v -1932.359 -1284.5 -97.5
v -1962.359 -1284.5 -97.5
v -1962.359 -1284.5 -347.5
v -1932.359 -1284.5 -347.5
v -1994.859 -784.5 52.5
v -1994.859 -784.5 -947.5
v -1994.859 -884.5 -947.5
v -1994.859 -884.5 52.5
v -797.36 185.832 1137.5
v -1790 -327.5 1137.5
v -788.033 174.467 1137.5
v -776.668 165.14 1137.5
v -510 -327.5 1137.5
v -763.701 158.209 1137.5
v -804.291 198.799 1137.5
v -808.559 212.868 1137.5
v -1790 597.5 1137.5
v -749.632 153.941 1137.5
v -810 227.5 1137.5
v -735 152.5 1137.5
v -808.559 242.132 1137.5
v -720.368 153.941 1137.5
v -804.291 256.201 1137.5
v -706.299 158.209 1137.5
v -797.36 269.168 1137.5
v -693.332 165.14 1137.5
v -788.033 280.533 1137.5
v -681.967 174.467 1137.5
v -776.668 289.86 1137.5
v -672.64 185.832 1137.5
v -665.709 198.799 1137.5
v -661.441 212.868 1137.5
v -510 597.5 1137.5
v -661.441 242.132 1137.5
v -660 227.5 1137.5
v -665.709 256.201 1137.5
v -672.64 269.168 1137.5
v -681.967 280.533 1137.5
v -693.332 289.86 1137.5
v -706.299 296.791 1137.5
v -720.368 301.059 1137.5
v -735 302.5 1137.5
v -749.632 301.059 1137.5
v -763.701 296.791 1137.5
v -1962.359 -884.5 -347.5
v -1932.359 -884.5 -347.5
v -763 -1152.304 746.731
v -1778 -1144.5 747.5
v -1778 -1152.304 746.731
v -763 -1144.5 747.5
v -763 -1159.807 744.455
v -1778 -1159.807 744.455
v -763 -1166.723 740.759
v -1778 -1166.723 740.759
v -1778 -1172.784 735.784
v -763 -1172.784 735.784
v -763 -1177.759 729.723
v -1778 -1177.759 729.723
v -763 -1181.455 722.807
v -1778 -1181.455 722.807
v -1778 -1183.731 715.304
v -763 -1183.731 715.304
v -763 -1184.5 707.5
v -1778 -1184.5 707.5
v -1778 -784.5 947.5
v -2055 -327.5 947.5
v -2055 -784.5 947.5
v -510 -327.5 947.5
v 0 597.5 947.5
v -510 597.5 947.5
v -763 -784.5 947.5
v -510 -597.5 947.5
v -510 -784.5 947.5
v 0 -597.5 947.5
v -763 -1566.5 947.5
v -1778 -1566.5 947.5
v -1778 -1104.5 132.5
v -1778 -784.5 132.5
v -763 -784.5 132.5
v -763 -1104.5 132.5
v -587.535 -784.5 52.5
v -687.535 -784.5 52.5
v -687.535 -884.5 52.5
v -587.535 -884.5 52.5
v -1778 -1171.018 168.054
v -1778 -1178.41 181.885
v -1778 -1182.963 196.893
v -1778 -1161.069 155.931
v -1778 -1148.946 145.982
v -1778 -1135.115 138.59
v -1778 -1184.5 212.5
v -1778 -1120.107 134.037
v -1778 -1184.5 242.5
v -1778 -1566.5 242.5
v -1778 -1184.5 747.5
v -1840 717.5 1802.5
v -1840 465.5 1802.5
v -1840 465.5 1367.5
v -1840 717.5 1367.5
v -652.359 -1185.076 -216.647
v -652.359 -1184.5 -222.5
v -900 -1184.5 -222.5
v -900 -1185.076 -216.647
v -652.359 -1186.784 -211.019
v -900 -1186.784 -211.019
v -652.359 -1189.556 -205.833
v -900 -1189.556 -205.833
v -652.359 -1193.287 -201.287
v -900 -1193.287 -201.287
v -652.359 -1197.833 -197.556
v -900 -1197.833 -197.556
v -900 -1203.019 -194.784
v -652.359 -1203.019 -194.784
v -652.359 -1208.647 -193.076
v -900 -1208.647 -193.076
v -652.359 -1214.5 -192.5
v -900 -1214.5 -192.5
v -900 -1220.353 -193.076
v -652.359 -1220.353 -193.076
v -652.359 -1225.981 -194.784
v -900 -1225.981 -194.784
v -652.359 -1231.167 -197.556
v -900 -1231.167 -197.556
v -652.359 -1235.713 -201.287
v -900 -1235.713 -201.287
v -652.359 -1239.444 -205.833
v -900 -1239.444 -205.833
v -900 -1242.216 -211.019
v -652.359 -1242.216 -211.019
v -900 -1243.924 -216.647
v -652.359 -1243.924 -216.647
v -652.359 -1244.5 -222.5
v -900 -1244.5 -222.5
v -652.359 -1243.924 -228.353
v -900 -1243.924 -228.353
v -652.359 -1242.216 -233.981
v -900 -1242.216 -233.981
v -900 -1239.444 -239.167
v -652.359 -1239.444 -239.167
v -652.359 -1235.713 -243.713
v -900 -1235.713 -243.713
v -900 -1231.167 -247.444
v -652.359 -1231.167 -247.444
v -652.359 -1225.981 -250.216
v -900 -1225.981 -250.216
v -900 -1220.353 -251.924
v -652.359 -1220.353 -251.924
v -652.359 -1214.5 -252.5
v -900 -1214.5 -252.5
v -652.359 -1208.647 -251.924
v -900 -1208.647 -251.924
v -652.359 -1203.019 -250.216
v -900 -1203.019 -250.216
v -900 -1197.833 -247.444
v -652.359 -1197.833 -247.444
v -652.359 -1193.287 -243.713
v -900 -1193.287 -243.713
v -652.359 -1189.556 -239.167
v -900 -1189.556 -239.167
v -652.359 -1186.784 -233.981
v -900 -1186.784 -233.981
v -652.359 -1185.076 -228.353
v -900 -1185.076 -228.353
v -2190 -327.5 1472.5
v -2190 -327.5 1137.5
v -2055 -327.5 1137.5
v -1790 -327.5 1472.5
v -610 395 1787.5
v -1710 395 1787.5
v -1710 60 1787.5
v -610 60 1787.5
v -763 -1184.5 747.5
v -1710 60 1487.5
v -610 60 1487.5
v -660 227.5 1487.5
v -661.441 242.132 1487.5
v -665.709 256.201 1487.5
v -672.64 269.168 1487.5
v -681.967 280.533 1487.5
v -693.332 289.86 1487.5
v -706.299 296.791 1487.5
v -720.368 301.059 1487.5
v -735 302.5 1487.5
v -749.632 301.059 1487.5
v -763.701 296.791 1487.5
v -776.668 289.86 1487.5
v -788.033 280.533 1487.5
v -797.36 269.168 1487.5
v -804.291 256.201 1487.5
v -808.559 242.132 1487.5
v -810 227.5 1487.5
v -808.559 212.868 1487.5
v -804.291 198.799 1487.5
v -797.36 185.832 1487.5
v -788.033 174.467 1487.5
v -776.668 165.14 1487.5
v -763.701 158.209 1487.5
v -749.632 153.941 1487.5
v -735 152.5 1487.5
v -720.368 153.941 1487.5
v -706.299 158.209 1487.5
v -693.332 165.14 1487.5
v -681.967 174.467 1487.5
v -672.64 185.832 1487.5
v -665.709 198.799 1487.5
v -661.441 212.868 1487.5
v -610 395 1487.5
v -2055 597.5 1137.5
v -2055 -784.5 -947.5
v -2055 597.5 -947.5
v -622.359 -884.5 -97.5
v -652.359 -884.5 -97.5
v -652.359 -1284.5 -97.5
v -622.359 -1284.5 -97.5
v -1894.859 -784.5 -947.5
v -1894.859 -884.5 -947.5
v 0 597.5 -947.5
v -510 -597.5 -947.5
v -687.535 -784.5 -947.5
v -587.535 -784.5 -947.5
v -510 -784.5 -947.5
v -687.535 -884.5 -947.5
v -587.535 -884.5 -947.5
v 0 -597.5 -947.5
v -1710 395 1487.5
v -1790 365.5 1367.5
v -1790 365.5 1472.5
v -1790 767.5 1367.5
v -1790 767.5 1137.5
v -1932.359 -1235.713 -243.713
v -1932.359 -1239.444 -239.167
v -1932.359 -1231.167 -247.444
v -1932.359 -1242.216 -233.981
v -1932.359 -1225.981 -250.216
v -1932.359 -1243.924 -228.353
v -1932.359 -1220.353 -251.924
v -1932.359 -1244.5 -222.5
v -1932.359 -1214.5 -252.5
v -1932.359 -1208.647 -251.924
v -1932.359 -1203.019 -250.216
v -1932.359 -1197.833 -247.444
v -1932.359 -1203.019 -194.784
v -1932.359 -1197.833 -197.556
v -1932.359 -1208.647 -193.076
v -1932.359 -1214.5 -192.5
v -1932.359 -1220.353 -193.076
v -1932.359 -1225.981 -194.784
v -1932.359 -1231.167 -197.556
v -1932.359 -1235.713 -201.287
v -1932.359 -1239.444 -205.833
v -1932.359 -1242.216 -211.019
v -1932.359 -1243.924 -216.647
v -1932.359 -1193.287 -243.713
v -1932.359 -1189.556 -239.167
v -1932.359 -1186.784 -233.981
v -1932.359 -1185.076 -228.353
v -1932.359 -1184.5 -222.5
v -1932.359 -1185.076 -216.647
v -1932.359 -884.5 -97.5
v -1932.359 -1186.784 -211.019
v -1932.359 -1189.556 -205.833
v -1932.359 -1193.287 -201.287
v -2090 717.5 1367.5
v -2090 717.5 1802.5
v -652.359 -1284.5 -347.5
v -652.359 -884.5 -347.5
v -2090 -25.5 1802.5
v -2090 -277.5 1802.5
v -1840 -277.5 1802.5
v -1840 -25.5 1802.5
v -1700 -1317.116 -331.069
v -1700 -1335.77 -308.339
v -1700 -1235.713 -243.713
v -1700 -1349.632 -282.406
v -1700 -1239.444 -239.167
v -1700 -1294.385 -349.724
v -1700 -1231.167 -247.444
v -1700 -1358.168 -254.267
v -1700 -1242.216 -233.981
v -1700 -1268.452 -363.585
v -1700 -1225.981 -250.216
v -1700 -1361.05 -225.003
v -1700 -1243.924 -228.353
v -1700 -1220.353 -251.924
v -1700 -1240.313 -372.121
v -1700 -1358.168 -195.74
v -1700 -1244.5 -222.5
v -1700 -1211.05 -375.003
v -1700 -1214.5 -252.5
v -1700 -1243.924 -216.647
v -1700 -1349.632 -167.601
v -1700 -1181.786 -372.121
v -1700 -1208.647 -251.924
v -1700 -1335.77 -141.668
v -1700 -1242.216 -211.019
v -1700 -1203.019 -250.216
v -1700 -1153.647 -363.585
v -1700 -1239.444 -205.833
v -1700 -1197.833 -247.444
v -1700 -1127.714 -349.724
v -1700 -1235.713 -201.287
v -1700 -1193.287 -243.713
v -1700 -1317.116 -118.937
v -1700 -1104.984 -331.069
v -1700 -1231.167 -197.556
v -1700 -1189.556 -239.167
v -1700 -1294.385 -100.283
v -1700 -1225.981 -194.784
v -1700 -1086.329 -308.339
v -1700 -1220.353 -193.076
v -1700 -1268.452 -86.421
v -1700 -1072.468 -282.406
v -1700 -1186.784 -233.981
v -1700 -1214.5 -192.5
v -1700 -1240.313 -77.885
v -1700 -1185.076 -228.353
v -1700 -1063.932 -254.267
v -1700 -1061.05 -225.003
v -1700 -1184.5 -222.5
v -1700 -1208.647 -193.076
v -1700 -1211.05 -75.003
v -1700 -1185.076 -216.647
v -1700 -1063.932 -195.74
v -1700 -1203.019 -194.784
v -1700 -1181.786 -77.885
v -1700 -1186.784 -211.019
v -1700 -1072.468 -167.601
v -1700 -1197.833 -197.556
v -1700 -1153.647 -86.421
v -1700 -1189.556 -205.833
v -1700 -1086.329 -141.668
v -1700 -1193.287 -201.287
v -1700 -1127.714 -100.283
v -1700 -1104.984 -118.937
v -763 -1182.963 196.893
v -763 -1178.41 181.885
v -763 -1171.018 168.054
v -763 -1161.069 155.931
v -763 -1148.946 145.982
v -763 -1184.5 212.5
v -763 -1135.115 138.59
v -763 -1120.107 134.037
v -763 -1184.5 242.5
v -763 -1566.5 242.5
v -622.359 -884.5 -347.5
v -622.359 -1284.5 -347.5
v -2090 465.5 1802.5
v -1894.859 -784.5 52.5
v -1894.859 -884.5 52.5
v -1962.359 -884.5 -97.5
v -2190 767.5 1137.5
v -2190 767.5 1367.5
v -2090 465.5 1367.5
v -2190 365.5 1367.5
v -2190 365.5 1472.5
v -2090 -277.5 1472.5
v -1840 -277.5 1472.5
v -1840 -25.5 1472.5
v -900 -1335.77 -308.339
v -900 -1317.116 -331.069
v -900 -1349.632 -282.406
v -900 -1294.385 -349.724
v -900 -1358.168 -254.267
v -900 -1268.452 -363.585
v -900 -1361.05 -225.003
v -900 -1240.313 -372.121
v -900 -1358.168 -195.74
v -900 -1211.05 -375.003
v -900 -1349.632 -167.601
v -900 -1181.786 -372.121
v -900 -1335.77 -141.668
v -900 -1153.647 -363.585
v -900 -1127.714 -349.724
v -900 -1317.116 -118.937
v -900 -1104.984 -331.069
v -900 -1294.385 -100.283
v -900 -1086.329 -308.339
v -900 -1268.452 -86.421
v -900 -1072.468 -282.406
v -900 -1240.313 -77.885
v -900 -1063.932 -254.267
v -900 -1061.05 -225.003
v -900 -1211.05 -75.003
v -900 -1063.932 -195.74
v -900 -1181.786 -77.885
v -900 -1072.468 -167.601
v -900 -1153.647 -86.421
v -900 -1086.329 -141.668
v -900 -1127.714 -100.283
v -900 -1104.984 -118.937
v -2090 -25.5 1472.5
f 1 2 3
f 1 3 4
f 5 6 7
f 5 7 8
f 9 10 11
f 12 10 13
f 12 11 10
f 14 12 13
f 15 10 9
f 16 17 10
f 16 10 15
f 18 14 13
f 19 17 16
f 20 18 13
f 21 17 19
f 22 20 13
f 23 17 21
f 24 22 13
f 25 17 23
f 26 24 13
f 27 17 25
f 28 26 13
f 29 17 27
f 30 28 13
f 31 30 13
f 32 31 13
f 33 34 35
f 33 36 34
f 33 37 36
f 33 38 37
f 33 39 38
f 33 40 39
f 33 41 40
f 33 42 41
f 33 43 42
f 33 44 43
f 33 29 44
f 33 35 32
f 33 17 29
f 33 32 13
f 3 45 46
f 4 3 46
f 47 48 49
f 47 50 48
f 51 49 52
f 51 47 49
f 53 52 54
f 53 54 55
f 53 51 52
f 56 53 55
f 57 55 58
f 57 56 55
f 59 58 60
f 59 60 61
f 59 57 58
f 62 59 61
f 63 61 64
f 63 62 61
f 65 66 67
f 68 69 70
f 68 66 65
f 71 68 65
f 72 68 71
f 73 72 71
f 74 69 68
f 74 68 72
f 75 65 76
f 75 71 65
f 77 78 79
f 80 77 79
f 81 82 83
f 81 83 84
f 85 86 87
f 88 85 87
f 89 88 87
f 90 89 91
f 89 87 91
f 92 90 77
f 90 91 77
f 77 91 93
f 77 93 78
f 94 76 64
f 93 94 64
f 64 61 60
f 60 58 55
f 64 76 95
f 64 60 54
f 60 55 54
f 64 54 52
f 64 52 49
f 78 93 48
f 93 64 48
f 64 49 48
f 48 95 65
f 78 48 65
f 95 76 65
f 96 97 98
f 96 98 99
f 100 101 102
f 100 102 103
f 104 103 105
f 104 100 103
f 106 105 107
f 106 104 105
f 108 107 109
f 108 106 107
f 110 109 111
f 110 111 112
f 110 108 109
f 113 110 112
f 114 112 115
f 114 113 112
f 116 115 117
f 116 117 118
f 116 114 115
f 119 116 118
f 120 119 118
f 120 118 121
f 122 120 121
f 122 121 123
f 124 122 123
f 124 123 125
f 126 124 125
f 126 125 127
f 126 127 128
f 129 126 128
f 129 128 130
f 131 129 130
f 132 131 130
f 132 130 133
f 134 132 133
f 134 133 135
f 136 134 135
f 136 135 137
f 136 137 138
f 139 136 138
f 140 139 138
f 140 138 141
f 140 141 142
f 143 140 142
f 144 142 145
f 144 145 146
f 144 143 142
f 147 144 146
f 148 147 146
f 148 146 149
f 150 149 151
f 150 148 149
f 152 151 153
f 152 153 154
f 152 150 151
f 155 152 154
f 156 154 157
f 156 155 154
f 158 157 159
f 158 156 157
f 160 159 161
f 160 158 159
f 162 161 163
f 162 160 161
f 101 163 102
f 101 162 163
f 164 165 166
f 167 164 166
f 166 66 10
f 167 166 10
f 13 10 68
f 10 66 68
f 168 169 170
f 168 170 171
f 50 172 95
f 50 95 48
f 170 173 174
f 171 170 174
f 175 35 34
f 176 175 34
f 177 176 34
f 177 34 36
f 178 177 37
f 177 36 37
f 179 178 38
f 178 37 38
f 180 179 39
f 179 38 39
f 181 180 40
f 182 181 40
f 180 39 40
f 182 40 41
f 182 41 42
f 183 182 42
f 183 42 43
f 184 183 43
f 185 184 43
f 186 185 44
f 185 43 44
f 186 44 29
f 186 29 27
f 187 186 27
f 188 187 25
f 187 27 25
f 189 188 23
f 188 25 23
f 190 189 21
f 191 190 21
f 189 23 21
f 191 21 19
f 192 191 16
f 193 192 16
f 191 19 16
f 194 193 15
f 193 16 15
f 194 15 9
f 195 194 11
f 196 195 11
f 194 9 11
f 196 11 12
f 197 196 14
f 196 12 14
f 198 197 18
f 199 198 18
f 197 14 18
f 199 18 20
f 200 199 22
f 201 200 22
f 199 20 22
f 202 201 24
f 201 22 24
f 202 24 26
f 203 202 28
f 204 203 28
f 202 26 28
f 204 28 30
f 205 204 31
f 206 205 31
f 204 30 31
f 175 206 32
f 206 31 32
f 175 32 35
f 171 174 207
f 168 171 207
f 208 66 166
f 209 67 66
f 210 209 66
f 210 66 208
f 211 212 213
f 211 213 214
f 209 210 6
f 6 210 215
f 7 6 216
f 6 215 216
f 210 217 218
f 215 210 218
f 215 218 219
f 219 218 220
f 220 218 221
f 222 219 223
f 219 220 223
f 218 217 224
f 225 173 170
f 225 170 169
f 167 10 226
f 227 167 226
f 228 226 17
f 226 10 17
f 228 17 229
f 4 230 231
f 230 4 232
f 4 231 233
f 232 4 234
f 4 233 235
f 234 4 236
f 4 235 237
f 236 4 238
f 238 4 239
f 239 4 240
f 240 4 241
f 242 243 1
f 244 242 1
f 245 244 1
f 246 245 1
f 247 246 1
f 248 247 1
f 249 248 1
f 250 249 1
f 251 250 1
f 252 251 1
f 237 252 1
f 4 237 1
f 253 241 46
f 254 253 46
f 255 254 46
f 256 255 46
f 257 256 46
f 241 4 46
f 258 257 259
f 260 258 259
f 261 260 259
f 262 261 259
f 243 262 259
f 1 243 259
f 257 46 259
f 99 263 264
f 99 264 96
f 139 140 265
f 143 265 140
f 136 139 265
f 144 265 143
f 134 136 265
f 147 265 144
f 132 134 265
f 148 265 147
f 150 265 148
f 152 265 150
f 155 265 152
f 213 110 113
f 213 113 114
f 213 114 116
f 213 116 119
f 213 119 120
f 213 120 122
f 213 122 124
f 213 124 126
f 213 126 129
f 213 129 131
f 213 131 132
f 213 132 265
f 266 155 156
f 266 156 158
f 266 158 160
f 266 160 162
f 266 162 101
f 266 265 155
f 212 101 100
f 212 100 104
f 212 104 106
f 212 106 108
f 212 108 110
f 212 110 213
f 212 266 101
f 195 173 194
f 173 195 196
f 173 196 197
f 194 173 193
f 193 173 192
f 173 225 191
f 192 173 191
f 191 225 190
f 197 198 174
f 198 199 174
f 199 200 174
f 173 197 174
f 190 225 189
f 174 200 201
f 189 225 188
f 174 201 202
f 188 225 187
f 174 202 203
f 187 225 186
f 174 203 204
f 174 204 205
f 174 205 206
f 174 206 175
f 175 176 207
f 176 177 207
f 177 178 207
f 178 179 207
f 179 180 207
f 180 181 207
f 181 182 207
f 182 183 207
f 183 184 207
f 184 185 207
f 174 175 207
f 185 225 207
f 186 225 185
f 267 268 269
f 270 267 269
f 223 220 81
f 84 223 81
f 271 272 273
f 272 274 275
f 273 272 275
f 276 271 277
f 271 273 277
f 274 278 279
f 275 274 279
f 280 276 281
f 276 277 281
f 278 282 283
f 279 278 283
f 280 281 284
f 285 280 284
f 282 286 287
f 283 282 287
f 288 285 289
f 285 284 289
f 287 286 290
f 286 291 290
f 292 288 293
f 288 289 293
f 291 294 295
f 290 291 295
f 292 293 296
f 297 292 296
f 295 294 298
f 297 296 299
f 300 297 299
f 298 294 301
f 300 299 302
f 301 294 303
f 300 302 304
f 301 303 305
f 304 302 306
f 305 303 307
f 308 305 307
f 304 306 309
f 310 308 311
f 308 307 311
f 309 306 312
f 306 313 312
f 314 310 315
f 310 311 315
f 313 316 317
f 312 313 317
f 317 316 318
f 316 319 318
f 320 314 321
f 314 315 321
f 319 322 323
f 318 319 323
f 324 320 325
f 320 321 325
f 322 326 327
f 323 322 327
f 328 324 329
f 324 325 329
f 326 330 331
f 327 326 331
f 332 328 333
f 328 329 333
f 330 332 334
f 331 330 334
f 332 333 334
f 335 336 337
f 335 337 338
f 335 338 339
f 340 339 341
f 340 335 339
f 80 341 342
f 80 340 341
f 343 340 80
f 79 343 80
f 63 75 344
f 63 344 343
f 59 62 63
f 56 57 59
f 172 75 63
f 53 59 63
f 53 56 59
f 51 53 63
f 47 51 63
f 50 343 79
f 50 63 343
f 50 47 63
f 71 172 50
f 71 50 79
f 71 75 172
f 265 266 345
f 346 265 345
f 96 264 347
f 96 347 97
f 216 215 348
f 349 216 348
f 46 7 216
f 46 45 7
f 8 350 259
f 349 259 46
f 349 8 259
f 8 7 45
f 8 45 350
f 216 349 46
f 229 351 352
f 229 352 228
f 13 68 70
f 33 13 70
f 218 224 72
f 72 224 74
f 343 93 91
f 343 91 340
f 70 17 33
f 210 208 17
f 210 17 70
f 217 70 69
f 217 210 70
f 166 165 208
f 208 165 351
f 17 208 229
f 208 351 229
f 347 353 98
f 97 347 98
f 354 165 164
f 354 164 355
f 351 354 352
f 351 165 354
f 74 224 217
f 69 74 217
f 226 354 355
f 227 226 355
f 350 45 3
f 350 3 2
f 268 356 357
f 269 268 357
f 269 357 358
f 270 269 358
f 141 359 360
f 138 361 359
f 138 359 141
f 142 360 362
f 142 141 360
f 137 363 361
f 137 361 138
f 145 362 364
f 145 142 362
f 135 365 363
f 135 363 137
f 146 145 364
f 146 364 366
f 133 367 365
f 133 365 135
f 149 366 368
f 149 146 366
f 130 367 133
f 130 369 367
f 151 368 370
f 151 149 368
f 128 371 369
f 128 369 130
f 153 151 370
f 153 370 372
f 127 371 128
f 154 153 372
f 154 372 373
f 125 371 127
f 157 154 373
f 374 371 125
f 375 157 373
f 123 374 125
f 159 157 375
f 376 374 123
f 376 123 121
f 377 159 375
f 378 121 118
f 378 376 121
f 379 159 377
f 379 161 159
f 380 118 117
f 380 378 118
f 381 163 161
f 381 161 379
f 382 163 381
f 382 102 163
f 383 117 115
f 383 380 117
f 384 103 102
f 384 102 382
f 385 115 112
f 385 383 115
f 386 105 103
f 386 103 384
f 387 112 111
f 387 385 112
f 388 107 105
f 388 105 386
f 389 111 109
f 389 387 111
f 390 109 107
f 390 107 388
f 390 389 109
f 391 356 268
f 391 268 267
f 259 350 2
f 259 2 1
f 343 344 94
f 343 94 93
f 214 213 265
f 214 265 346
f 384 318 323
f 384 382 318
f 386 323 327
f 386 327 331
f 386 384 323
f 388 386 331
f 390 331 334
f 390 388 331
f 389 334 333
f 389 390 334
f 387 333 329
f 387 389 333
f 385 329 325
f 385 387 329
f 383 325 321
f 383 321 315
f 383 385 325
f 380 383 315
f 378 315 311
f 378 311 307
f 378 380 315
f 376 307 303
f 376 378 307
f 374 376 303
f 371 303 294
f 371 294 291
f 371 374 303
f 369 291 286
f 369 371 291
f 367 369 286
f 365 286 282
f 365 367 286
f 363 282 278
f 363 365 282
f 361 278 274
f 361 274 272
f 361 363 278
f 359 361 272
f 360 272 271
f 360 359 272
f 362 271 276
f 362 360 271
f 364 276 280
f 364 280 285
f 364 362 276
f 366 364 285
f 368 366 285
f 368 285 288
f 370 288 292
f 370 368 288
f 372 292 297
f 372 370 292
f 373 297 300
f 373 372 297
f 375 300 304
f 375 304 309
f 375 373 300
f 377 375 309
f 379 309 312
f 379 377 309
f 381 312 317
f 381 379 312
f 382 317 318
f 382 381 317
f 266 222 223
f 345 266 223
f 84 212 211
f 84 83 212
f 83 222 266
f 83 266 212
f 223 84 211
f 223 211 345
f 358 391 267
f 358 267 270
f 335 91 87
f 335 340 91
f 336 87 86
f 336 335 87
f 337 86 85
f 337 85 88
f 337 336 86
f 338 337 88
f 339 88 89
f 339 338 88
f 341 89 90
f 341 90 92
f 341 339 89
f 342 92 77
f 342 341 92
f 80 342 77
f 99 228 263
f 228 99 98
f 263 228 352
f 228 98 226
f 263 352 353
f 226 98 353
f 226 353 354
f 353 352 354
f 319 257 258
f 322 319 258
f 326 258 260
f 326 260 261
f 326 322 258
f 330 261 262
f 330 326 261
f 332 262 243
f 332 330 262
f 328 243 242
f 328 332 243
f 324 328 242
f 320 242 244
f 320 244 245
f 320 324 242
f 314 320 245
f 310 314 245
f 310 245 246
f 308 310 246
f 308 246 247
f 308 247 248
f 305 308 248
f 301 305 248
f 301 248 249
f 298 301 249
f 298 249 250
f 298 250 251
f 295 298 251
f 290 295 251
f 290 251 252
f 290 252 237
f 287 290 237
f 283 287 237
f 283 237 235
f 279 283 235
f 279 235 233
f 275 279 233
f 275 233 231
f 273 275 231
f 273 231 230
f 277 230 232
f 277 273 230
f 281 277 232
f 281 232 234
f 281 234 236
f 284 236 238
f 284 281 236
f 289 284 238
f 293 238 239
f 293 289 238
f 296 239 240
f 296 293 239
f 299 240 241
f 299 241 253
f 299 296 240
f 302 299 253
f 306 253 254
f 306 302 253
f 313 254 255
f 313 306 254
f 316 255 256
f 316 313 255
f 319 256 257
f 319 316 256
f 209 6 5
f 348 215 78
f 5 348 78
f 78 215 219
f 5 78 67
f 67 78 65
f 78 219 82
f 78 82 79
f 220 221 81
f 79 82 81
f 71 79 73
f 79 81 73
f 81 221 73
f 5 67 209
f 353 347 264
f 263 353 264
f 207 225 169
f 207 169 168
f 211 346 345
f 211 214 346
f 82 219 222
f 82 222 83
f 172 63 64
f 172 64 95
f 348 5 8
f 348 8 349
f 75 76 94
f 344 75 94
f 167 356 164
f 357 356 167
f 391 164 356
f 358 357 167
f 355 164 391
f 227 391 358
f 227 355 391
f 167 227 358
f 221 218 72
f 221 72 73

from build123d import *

# Parameters (mm, degrees)
F0_W      = 597.5
F0_H      = 1895
F1_DEPTH  = 510
F2_W      = 1382
F2_H      = 1895
F3_DEPTH  = 1545
F4_W      = 1015
F4_H      = 615
F5_DEPTH  = 400
F6_R      = 40
F7_R      = 80
F9_DEPTH  = 1015
F10_W     = 1545
F10_H     = 925
F11_DEPTH = 190
F12_R     = 75
F13_DEPTH = 350
F14_W     = 1100
F14_H     = 335
F15_DEPTH = 300
F16_W     = 400
F16_H     = 1095
F17_DEPTH = 335
F18_W     = 402
F18_H     = 105
F19_DEPTH = 400
F20_W     = 250
F20_H     = 252
F21_DEPTH = 435
F22_W     = 250
F22_H     = 252
F23_DEPTH = 330
F24_W     = 100
F24_H     = 1000
F25_DEPTH = 100
F26_W     = 100
F26_H     = 1000
F27_DEPTH = 100
F28_W     = 30
F28_H     = 250
F29_DEPTH = 400
F30_R     = 30
F31_DEPTH = 1310
F33_R     = 150
F34_DEPTH = 400


with BuildPart() as f1:
    # F0 (on Right) → F1 (new body)
    with BuildSketch(Plane.YZ):
        with Locations((298.75, 0)):
            Rectangle(F0_W, F0_H)
        with Locations((-298.75, 0)):
            Rectangle(F0_W, F0_H)
    extrude(amount=-F1_DEPTH)

    # F2 (on face) → F3 (join)
    with BuildSketch(Plane(origin=(-510, 0, 0), x_dir=(0, -1, 0), z_dir=(-1, 0, 0))):
        with Locations((93.5, 0)):
            Rectangle(F2_W, F2_H)
    extrude(amount=F3_DEPTH)

    # F4 (on face) → F5 (join)
    with BuildSketch(Plane.XZ.offset(784.5)):
        with Locations((-1270.5, 440)):
            Rectangle(F4_W, F4_H)
    extrude(amount=F5_DEPTH)

    # F6
    f6_edges = [f1.edges().sort_by_distance(p)[0] for p in [
        (-1270.5, -1184.5, 747.5),
    ]]
    fillet(f6_edges, radius=F6_R)

    # F7
    f7_edges = [f1.edges().sort_by_distance(p)[0] for p in [
        (-1270.5, -1184.5, 132.5),
    ]]
    fillet(f7_edges, radius=F7_R)

    # F8 (on face) → F9 (join)
    with BuildSketch(Plane.YZ.offset(-763)):
        Polygon((-1184.5, 747.5), (-784.5, 747.5), (-784.5, 947.5), (-1566.5, 947.5), (-1566.5, 242.5), (-1184.5, 242.5), align=None)
    extrude(amount=-F9_DEPTH)

    # F10 (on face) → F11 (join)
    with BuildSketch(Plane.XY.offset(947.5)):
        with Locations((-1282.5, 135)):
            Rectangle(F10_W, F10_H)
    extrude(amount=F11_DEPTH)

    # F12 (on face) → F13 (join)
    with BuildSketch(Plane.XY.offset(1137.5)):
        with Locations((-735, 227.5)):
            Circle(F12_R)
    extrude(amount=F13_DEPTH)

    # F14 (on face) → F15 (join)
    with BuildSketch(Plane.XY.offset(1487.5)):
        with Locations((-1160, 227.5)):
            Rectangle(F14_W, F14_H)
    extrude(amount=F15_DEPTH)

    # F16 (on face) → F17 (join)
    with BuildSketch(Plane.XY.offset(1137.5)):
        with Locations((-1990, 220)):
            Rectangle(F16_W, F16_H)
    extrude(amount=F17_DEPTH)

    # F18 (on face) → F19 (cut, through all)
    with BuildSketch(Plane(origin=(-2190, 0, 0), x_dir=(0, -1, 0), z_dir=(-1, 0, 0))):
        with Locations((-566.5, 1420)):
            Rectangle(F18_W, F18_H)
    extrude(amount=-F19_DEPTH, mode=Mode.SUBTRACT)

    # F20 (on face) → F21 (join)
    with BuildSketch(Plane.XY.offset(1367.5)):
        with Locations((-1965, 591.5)):
            Rectangle(F20_W, F20_H)
    extrude(amount=F21_DEPTH)

    # F22 (on face) → F23 (join)
    with BuildSketch(Plane.XY.offset(1472.5)):
        with Locations((-1965, -151.5)):
            Rectangle(F22_W, F22_H)
    extrude(amount=F23_DEPTH)

    # F24 (on face) → F25 (join)
    with BuildSketch(Plane.XZ.offset(784.5)):
        with Locations((-637.535286, -447.5)):
            Rectangle(F24_W, F24_H)
    extrude(amount=F25_DEPTH)

    # F26 (on face) → F27 (join)
    with BuildSketch(Plane.XZ.offset(784.5)):
        with Locations((-1944.85898, -447.5)):
            Rectangle(F26_W, F26_H)
    extrude(amount=F27_DEPTH)

    # F28 (on face) → F29 (join)
    with BuildSketch(Plane.XZ.offset(884.5)):
        with Locations((-637.358516, -222.5)):
            Rectangle(F28_W, F28_H)
        with Locations((-1947.358516, -222.5)):
            Rectangle(F28_W, F28_H)
    extrude(amount=F29_DEPTH)

    # F30 (on face) → F31 (join, through all)
    with BuildSketch(Plane.YZ.offset(-622.358516)):
        with Locations((-1214.5, -222.5)):
            Circle(F30_R)
    extrude(amount=-F31_DEPTH)

    # F33 (on offset) → F34 (join, symmetric)
    with BuildSketch(Plane.YZ.offset(-1300)):
        with Locations((-1211.049914, -225.003153)):
            Circle(F33_R)
    extrude(amount=F34_DEPTH, both=True)


solid = f1.part
